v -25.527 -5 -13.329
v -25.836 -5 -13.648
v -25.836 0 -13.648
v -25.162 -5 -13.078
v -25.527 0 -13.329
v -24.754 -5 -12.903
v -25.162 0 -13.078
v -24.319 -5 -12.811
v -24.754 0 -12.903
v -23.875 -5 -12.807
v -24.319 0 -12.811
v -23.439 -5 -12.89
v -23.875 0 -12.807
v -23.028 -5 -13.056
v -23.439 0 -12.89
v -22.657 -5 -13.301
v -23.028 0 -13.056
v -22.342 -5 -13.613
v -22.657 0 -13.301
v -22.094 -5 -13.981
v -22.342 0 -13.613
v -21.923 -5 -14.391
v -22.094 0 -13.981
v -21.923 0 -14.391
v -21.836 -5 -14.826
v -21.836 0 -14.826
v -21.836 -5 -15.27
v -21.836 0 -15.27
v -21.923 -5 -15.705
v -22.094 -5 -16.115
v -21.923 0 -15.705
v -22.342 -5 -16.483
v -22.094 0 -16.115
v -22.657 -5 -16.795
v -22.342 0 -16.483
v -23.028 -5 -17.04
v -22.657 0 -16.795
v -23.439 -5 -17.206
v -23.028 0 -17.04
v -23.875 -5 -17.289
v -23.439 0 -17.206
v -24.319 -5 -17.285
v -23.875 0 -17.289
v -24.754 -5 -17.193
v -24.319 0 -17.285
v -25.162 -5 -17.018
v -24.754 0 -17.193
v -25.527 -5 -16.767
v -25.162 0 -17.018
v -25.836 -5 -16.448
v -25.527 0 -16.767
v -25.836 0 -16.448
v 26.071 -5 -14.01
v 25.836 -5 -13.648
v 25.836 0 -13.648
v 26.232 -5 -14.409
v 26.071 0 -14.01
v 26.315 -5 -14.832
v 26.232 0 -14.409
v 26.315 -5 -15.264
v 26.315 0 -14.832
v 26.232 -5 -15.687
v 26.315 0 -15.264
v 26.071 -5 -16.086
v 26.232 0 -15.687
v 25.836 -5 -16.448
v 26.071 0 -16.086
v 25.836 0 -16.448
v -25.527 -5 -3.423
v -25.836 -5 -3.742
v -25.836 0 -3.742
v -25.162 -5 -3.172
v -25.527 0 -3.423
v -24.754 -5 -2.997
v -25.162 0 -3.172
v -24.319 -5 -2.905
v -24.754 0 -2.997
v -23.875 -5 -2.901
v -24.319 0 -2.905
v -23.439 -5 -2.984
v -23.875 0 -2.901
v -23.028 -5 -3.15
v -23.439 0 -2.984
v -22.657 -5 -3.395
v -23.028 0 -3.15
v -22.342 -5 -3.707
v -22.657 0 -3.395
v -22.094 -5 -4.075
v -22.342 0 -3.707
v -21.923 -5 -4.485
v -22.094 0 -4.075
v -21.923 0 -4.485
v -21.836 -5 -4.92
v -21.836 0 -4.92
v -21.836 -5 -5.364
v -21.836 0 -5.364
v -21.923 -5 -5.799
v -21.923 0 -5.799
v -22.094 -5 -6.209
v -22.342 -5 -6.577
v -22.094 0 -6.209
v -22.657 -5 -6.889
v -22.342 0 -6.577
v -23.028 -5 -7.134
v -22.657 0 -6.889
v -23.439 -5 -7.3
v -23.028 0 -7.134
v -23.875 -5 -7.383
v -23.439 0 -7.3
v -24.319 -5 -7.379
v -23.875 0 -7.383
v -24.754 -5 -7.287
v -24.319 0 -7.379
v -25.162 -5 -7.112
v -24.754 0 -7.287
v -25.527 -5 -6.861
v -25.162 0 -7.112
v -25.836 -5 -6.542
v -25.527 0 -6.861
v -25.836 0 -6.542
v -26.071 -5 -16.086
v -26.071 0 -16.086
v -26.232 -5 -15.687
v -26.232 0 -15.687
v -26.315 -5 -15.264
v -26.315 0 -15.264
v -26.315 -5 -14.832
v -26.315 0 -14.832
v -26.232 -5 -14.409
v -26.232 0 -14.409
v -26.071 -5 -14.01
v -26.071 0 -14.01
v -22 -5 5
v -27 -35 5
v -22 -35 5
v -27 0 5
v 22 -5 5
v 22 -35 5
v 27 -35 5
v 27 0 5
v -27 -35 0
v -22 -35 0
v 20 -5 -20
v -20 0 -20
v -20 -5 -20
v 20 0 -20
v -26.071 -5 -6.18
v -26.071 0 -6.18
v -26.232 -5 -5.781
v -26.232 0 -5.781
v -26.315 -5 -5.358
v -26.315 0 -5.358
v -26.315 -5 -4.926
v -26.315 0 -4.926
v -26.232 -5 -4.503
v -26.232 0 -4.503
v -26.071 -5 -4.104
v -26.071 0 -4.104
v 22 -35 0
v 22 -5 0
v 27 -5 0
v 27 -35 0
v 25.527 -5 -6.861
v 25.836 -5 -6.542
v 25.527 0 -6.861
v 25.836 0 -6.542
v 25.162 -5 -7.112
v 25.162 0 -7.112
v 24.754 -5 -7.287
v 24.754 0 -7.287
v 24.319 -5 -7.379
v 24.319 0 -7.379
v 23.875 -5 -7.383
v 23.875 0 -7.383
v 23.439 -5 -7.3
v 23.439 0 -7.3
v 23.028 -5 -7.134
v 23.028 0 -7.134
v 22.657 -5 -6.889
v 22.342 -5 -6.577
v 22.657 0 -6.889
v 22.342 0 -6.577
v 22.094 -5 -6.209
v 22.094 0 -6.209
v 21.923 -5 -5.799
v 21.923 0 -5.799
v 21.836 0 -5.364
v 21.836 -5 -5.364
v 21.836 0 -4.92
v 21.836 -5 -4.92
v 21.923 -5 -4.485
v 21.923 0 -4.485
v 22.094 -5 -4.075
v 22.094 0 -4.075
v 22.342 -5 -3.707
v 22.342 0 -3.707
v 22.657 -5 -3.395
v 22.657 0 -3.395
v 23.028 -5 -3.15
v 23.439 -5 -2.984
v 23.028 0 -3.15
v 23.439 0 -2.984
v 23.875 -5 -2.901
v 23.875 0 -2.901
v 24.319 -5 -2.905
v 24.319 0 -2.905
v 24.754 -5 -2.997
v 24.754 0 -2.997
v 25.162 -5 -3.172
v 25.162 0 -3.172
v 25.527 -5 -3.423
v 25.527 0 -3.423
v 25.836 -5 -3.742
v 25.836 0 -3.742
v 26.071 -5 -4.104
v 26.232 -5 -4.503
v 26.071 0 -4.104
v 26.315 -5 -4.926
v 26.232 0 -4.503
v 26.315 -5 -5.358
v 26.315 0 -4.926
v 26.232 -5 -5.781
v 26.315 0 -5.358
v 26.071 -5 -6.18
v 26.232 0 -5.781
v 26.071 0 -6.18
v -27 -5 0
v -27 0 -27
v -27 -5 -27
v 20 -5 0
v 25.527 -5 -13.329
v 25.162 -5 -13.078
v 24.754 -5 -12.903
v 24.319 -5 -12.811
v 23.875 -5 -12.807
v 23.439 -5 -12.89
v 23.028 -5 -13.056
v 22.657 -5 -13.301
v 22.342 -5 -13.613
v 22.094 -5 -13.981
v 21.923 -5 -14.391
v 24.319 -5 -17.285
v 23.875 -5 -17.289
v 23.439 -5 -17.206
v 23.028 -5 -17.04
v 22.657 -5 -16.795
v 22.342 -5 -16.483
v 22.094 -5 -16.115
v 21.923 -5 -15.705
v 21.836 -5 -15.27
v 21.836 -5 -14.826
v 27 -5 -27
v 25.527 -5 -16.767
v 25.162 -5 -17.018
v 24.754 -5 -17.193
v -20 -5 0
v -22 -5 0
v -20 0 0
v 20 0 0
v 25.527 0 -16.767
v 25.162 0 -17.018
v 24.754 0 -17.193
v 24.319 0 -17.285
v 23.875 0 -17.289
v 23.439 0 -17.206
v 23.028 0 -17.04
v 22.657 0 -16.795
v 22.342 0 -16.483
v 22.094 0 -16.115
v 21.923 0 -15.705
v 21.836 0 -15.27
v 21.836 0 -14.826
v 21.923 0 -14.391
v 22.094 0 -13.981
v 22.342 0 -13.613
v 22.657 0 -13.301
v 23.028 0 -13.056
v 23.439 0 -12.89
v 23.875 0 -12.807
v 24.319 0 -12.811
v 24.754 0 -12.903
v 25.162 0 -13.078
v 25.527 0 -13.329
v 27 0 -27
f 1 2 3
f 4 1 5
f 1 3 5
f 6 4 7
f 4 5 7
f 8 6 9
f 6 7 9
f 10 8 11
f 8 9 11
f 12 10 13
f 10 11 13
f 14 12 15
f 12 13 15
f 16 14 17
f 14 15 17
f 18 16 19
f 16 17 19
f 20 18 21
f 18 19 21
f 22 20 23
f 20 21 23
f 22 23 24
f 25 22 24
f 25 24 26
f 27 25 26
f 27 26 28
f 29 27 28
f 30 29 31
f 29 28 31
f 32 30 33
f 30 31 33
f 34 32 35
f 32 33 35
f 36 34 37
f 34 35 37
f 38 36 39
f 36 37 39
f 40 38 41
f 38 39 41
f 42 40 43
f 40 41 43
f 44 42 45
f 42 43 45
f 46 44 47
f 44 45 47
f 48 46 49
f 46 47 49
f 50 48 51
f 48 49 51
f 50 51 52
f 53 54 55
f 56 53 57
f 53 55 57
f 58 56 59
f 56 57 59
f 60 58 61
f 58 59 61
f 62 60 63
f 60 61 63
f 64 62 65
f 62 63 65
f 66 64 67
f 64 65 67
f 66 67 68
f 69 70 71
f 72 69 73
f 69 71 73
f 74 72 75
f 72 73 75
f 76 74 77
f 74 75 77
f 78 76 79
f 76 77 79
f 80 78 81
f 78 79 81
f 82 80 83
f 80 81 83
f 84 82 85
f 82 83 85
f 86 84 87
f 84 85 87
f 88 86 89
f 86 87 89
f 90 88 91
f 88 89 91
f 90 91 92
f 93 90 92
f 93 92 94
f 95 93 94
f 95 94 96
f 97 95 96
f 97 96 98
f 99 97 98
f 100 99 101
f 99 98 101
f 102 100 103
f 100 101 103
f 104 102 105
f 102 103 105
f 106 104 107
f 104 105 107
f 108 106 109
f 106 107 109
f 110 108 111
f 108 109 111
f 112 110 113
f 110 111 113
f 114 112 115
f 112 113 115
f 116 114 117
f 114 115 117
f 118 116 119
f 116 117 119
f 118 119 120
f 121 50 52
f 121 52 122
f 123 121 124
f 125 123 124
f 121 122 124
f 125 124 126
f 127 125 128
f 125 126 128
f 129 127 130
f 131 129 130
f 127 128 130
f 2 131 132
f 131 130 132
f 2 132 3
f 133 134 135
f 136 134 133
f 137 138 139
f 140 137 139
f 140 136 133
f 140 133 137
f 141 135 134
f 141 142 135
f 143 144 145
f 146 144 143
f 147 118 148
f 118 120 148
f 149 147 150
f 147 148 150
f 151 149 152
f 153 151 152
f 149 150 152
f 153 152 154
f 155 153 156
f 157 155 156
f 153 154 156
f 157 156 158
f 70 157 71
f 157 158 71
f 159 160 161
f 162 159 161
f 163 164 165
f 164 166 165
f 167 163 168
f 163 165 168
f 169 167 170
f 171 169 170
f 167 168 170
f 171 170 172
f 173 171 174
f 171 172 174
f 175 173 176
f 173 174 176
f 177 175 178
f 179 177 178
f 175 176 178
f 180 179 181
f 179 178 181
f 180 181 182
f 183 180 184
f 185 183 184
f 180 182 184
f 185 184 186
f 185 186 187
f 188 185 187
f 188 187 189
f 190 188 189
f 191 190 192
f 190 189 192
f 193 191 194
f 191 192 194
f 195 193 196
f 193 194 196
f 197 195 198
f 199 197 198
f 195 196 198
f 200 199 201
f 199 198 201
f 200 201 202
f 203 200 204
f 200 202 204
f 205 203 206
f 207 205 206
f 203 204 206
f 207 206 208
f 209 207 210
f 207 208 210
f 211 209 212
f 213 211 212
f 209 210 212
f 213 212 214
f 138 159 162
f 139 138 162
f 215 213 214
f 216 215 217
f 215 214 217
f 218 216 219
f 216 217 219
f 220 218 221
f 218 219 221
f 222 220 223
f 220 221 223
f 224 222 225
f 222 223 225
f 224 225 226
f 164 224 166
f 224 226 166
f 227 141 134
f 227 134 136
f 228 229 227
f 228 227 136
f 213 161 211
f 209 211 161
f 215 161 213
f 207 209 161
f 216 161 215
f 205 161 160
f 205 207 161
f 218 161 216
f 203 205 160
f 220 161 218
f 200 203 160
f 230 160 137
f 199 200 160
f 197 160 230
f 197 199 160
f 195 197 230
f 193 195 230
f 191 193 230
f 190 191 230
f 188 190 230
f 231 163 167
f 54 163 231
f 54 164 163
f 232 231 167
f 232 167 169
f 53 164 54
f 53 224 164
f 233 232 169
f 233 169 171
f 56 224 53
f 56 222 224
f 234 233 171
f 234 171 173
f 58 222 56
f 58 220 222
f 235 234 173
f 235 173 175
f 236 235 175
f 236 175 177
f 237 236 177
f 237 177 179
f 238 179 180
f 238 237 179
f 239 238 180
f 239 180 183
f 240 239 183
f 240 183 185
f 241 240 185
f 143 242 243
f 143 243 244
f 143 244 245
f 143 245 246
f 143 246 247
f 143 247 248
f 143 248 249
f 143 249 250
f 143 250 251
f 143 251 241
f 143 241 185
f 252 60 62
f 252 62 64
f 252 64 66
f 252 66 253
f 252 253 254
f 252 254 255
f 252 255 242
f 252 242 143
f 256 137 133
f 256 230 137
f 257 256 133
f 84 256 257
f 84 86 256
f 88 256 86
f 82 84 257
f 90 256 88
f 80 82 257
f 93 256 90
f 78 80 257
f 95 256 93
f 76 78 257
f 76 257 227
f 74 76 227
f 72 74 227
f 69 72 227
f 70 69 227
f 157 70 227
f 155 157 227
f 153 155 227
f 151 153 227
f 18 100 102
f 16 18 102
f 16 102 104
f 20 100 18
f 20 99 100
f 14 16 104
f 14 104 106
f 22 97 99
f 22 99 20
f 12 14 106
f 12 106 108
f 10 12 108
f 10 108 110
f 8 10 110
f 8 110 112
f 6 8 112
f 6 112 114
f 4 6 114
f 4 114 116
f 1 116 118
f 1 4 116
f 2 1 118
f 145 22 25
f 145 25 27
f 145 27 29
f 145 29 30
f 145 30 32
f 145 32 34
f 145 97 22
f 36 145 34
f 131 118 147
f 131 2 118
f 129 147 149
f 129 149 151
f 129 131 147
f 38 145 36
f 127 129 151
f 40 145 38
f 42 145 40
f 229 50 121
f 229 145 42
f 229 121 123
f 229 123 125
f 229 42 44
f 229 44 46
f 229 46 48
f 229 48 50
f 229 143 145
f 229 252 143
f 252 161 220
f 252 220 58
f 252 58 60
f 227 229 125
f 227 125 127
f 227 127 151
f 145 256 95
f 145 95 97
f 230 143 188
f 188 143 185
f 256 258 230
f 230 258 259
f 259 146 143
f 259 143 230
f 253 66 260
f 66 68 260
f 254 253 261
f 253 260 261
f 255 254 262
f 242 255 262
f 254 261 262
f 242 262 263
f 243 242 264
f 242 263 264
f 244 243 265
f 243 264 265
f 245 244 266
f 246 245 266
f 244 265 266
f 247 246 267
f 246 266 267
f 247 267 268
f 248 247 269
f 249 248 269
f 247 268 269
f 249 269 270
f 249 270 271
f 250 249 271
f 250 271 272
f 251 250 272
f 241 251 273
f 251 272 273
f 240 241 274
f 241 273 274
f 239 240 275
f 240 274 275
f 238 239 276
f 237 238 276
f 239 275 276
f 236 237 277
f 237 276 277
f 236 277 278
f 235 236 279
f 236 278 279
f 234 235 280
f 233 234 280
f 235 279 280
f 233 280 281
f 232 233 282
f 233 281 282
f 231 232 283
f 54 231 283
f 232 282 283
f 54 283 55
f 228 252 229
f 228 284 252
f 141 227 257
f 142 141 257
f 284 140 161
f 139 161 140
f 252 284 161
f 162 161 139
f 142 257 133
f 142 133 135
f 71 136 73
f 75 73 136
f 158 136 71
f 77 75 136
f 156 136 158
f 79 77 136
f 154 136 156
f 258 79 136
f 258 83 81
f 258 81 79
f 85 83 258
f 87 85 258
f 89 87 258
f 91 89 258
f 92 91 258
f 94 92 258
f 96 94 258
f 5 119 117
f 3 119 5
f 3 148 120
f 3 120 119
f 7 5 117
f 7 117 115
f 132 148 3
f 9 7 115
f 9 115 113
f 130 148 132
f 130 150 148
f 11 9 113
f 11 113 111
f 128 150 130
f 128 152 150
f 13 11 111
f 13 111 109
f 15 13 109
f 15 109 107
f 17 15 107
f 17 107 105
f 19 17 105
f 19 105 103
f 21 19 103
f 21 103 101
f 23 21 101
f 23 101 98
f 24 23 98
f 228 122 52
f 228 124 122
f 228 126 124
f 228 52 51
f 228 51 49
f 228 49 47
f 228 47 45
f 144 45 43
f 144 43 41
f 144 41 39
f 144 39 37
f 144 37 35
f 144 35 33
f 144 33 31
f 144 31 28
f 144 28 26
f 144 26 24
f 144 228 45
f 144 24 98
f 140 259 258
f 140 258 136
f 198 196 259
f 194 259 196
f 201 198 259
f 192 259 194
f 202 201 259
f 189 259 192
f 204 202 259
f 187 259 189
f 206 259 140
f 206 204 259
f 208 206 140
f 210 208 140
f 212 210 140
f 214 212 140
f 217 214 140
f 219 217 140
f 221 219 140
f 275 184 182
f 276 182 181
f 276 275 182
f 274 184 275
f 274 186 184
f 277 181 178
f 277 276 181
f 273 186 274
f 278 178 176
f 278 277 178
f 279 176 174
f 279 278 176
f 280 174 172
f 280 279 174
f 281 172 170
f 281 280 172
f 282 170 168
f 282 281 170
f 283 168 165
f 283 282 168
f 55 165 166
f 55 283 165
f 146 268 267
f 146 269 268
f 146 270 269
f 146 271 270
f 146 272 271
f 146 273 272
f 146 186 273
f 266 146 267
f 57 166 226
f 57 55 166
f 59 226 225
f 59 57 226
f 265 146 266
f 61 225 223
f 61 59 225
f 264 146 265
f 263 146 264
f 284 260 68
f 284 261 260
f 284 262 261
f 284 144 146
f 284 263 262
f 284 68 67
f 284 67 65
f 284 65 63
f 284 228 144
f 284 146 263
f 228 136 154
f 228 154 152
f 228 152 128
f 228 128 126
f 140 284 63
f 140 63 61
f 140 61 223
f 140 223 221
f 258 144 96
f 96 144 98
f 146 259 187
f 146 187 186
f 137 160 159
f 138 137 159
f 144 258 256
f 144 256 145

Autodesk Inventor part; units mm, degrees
ref_plane "YZ Plane" through (0, 0, 0) normal (1, 0, 0) x (0, 1, 0)
ref_plane "XZ Plane" through (0, 0, 0) normal (0, 1, 0) x (-1, 0, 0)
ref_plane "XY Plane" through (0, 0, 0) normal (0, 0, 1) x (1, 0, 0)
sketch "Эскиз1" plane through (0, 0, 0) normal (0, 0, 1) x (1, 0, 0)
  line L0 (-27, 0) -> (27, 0)
  line L1 (27, 0) -> (27, -5)
  line L2 (27, -5) -> (-27, -5)
  line L3 (-27, -5) -> (-27, 0)
  line L4 (27, -5) -> (22, -5)
  line L5 (22, -5) -> (22, -35)
  line L6 (22, -35) -> (27, -35)
  line L7 (27, -35) -> (27, -5)
  line L8 (-27, -5) -> (-22, -5)
  line L9 (-22, -5) -> (-22, -35)
  line L10 (-22, -35) -> (-27, -35)
  line L11 (-27, -35) -> (-27, -5)
  point P0 (0, 0)
  point P1 (0, 0)
  point P2 (-22, -5)
  point P3 (22, -5)
  dimension "d0" = 35
  dimension "d1" = 5
  dimension "d2" = 54
  dimension "d3" = 5
extrude "Выдавливание1" add sketch "Эскиз1" along normal blind 5
sketch "Эскиз3" plane through (-27, 0, 0) normal (0, 1, 0) x (1, 0, 0)
  line L0 (0, 0) -> (7, 0)
  line L1 (7, 0) -> (7, 20)
  line L2 (7, 20) -> (0, 20)
  line L3 (0, 20) -> (0, 0)
  line L4 (0, 20) -> (54, 20)
  line L5 (54, 20) -> (54, 27)
  line L6 (54, 27) -> (0, 27)
  line L7 (0, 27) -> (0, 20)
  line L8 (54, 0) -> (0, 0) projected
  line L9 (54, 20) -> (47, 20)
  line L10 (47, 20) -> (47, 0)
  line L11 (47, 0) -> (54, 0)
  line L12 (54, 0) -> (54, 20)
  line L13 (54, 0) -> (54, -5) projected
  point P0 (27, 0)
  point P1 (54, 0)
  dimension "d6" = 7
  dimension "d7" = 7
  dimension "d8" = 7
  dimension "d9" = 20
extrude "Выдавливание2" add sketch "Эскиз3" against normal blind 5 contours L3 L2 L1 L0 | L7 L6 L5 L4 L2 | L10 L4 L12 L8
sketch "Эскиз4" plane through (-27, 0, 5) normal (0, 1, 0) x (1, 0, 0)
  arc A0 (52.8363, 21.448) -> (52.8363, 18.648) centre (51.075, 20.048) ccw projected
  arc A1 (52.8363, 11.542) -> (52.8363, 8.742) centre (51.075, 10.142) ccw projected
  arc A2 (1.1636, 8.742) -> (1.1636, 11.542) centre (2.925, 10.142) ccw projected
  arc A3 (1.1636, 18.648) -> (1.1636, 21.448) centre (2.925, 20.048) ccw projected
  circle A4 centre (51.075, 20.048) radius 2.25
  circle A5 centre (51.075, 10.142) radius 2.25
  circle A6 centre (2.925, 10.142) radius 2.25
  circle A7 centre (2.925, 20.048) radius 2.25
  point P0 (27, 5)
  point P1 (1.1636, 21.448)
  point P2 (1.1636, 11.542)
  point P3 (52.8363, 8.742)
  point P4 (52.8363, 21.448)
extrude "Выдавливание3" cut sketch "Эскиз4" against normal blind 5
properties part number "держатель_сервы"
